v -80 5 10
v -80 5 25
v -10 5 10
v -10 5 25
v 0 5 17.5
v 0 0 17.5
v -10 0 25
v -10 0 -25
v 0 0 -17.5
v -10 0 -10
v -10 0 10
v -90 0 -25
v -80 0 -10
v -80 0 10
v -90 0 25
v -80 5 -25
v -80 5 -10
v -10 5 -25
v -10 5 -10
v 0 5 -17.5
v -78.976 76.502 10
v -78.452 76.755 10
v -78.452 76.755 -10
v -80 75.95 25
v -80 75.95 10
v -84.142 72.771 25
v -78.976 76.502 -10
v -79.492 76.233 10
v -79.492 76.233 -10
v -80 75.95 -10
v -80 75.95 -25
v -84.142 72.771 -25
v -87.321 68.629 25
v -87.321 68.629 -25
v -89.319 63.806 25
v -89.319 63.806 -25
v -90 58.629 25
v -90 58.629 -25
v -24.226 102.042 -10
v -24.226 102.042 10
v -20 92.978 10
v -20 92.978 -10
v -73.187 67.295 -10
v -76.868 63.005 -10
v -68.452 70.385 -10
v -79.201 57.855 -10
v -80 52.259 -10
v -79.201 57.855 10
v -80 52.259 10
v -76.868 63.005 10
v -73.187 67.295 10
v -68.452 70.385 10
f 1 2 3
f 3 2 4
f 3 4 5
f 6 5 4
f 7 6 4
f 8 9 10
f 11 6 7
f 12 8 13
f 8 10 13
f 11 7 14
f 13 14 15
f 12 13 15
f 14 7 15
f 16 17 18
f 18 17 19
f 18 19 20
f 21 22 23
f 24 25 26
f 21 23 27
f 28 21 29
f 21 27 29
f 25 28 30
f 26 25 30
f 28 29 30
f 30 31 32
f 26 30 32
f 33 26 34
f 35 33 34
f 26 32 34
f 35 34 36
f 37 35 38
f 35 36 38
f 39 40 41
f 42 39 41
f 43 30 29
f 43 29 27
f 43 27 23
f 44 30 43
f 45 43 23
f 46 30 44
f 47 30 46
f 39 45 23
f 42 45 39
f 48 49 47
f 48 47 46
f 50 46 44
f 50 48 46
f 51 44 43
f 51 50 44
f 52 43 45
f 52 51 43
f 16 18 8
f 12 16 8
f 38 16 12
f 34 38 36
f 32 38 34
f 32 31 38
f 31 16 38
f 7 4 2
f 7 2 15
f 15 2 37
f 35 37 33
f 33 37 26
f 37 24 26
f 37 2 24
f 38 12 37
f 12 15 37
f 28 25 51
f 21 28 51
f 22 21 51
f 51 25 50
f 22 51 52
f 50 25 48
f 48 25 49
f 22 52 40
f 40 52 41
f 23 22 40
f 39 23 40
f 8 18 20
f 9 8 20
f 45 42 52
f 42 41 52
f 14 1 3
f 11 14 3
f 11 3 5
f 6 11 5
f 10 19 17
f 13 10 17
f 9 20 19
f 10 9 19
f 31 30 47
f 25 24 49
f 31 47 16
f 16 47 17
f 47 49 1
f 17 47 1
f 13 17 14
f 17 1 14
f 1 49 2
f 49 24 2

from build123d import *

# Parameters (mm, degrees)
SALIENTE_EXTRUIR1_DEPTH = 25
REDONDEO1_R             = 20
CORTAR_EXTRUIR1_DEPTH   = 10
CROQUIS3_W              = 70
CROQUIS3_H              = 15
CORTAR_EXTRUIR2_DEPTH   = 135.692464426


with BuildPart() as part:
    # Croquis1 → Saliente-Extruir1 (new, symmetric)
    with BuildSketch(Plane.XY):
        Polygon((0, 5), (0, 0), (-90, 0), (-90, 71.370702608), (-24.226182617, 102.04153736), (-20, 92.978459489), (-80, 65), (-80, 5), align=None)
    extrude(amount=SALIENTE_EXTRUIR1_DEPTH, both=True)

    # Redondeo1
    redondeo1_edges = [part.edges().sort_by_distance(p)[0] for p in [
        (-90, 71.370702608, 0),
        (-80, 65, 0),
    ]]
    fillet(redondeo1_edges, radius=REDONDEO1_R)

    # Croquis2 → Cortar-Extruir1 (cut)
    with BuildSketch(Plane(origin=(0, 5, 0), x_dir=(1, 0, 0), z_dir=(0, 1, 0))):
        Polygon((-80, 10), (-80, -10), (-10, -10), (0, -17.5), (0, 17.5), (-10, 10), align=None)
        Polygon((-10, 25), (0, 17.5), (0, 25), align=None)
        Polygon((0, -17.5), (-10, -25), (0, -25), align=None)
    extrude(amount=-CORTAR_EXTRUIR1_DEPTH, mode=Mode.SUBTRACT)

    # Croquis3 → Cortar-Extruir2 (cut, through all)
    with BuildSketch(Plane(origin=(0, 5, 0), x_dir=(1, 0, 0), z_dir=(0, 1, 0))):
        with Locations((-45, -17.5)):
            Rectangle(CROQUIS3_W, CROQUIS3_H)
        with Locations((-45, 17.5)):
            Rectangle(CROQUIS3_W, CROQUIS3_H)
    extrude(amount=CORTAR_EXTRUIR2_DEPTH, mode=Mode.SUBTRACT)


solid = part.part
